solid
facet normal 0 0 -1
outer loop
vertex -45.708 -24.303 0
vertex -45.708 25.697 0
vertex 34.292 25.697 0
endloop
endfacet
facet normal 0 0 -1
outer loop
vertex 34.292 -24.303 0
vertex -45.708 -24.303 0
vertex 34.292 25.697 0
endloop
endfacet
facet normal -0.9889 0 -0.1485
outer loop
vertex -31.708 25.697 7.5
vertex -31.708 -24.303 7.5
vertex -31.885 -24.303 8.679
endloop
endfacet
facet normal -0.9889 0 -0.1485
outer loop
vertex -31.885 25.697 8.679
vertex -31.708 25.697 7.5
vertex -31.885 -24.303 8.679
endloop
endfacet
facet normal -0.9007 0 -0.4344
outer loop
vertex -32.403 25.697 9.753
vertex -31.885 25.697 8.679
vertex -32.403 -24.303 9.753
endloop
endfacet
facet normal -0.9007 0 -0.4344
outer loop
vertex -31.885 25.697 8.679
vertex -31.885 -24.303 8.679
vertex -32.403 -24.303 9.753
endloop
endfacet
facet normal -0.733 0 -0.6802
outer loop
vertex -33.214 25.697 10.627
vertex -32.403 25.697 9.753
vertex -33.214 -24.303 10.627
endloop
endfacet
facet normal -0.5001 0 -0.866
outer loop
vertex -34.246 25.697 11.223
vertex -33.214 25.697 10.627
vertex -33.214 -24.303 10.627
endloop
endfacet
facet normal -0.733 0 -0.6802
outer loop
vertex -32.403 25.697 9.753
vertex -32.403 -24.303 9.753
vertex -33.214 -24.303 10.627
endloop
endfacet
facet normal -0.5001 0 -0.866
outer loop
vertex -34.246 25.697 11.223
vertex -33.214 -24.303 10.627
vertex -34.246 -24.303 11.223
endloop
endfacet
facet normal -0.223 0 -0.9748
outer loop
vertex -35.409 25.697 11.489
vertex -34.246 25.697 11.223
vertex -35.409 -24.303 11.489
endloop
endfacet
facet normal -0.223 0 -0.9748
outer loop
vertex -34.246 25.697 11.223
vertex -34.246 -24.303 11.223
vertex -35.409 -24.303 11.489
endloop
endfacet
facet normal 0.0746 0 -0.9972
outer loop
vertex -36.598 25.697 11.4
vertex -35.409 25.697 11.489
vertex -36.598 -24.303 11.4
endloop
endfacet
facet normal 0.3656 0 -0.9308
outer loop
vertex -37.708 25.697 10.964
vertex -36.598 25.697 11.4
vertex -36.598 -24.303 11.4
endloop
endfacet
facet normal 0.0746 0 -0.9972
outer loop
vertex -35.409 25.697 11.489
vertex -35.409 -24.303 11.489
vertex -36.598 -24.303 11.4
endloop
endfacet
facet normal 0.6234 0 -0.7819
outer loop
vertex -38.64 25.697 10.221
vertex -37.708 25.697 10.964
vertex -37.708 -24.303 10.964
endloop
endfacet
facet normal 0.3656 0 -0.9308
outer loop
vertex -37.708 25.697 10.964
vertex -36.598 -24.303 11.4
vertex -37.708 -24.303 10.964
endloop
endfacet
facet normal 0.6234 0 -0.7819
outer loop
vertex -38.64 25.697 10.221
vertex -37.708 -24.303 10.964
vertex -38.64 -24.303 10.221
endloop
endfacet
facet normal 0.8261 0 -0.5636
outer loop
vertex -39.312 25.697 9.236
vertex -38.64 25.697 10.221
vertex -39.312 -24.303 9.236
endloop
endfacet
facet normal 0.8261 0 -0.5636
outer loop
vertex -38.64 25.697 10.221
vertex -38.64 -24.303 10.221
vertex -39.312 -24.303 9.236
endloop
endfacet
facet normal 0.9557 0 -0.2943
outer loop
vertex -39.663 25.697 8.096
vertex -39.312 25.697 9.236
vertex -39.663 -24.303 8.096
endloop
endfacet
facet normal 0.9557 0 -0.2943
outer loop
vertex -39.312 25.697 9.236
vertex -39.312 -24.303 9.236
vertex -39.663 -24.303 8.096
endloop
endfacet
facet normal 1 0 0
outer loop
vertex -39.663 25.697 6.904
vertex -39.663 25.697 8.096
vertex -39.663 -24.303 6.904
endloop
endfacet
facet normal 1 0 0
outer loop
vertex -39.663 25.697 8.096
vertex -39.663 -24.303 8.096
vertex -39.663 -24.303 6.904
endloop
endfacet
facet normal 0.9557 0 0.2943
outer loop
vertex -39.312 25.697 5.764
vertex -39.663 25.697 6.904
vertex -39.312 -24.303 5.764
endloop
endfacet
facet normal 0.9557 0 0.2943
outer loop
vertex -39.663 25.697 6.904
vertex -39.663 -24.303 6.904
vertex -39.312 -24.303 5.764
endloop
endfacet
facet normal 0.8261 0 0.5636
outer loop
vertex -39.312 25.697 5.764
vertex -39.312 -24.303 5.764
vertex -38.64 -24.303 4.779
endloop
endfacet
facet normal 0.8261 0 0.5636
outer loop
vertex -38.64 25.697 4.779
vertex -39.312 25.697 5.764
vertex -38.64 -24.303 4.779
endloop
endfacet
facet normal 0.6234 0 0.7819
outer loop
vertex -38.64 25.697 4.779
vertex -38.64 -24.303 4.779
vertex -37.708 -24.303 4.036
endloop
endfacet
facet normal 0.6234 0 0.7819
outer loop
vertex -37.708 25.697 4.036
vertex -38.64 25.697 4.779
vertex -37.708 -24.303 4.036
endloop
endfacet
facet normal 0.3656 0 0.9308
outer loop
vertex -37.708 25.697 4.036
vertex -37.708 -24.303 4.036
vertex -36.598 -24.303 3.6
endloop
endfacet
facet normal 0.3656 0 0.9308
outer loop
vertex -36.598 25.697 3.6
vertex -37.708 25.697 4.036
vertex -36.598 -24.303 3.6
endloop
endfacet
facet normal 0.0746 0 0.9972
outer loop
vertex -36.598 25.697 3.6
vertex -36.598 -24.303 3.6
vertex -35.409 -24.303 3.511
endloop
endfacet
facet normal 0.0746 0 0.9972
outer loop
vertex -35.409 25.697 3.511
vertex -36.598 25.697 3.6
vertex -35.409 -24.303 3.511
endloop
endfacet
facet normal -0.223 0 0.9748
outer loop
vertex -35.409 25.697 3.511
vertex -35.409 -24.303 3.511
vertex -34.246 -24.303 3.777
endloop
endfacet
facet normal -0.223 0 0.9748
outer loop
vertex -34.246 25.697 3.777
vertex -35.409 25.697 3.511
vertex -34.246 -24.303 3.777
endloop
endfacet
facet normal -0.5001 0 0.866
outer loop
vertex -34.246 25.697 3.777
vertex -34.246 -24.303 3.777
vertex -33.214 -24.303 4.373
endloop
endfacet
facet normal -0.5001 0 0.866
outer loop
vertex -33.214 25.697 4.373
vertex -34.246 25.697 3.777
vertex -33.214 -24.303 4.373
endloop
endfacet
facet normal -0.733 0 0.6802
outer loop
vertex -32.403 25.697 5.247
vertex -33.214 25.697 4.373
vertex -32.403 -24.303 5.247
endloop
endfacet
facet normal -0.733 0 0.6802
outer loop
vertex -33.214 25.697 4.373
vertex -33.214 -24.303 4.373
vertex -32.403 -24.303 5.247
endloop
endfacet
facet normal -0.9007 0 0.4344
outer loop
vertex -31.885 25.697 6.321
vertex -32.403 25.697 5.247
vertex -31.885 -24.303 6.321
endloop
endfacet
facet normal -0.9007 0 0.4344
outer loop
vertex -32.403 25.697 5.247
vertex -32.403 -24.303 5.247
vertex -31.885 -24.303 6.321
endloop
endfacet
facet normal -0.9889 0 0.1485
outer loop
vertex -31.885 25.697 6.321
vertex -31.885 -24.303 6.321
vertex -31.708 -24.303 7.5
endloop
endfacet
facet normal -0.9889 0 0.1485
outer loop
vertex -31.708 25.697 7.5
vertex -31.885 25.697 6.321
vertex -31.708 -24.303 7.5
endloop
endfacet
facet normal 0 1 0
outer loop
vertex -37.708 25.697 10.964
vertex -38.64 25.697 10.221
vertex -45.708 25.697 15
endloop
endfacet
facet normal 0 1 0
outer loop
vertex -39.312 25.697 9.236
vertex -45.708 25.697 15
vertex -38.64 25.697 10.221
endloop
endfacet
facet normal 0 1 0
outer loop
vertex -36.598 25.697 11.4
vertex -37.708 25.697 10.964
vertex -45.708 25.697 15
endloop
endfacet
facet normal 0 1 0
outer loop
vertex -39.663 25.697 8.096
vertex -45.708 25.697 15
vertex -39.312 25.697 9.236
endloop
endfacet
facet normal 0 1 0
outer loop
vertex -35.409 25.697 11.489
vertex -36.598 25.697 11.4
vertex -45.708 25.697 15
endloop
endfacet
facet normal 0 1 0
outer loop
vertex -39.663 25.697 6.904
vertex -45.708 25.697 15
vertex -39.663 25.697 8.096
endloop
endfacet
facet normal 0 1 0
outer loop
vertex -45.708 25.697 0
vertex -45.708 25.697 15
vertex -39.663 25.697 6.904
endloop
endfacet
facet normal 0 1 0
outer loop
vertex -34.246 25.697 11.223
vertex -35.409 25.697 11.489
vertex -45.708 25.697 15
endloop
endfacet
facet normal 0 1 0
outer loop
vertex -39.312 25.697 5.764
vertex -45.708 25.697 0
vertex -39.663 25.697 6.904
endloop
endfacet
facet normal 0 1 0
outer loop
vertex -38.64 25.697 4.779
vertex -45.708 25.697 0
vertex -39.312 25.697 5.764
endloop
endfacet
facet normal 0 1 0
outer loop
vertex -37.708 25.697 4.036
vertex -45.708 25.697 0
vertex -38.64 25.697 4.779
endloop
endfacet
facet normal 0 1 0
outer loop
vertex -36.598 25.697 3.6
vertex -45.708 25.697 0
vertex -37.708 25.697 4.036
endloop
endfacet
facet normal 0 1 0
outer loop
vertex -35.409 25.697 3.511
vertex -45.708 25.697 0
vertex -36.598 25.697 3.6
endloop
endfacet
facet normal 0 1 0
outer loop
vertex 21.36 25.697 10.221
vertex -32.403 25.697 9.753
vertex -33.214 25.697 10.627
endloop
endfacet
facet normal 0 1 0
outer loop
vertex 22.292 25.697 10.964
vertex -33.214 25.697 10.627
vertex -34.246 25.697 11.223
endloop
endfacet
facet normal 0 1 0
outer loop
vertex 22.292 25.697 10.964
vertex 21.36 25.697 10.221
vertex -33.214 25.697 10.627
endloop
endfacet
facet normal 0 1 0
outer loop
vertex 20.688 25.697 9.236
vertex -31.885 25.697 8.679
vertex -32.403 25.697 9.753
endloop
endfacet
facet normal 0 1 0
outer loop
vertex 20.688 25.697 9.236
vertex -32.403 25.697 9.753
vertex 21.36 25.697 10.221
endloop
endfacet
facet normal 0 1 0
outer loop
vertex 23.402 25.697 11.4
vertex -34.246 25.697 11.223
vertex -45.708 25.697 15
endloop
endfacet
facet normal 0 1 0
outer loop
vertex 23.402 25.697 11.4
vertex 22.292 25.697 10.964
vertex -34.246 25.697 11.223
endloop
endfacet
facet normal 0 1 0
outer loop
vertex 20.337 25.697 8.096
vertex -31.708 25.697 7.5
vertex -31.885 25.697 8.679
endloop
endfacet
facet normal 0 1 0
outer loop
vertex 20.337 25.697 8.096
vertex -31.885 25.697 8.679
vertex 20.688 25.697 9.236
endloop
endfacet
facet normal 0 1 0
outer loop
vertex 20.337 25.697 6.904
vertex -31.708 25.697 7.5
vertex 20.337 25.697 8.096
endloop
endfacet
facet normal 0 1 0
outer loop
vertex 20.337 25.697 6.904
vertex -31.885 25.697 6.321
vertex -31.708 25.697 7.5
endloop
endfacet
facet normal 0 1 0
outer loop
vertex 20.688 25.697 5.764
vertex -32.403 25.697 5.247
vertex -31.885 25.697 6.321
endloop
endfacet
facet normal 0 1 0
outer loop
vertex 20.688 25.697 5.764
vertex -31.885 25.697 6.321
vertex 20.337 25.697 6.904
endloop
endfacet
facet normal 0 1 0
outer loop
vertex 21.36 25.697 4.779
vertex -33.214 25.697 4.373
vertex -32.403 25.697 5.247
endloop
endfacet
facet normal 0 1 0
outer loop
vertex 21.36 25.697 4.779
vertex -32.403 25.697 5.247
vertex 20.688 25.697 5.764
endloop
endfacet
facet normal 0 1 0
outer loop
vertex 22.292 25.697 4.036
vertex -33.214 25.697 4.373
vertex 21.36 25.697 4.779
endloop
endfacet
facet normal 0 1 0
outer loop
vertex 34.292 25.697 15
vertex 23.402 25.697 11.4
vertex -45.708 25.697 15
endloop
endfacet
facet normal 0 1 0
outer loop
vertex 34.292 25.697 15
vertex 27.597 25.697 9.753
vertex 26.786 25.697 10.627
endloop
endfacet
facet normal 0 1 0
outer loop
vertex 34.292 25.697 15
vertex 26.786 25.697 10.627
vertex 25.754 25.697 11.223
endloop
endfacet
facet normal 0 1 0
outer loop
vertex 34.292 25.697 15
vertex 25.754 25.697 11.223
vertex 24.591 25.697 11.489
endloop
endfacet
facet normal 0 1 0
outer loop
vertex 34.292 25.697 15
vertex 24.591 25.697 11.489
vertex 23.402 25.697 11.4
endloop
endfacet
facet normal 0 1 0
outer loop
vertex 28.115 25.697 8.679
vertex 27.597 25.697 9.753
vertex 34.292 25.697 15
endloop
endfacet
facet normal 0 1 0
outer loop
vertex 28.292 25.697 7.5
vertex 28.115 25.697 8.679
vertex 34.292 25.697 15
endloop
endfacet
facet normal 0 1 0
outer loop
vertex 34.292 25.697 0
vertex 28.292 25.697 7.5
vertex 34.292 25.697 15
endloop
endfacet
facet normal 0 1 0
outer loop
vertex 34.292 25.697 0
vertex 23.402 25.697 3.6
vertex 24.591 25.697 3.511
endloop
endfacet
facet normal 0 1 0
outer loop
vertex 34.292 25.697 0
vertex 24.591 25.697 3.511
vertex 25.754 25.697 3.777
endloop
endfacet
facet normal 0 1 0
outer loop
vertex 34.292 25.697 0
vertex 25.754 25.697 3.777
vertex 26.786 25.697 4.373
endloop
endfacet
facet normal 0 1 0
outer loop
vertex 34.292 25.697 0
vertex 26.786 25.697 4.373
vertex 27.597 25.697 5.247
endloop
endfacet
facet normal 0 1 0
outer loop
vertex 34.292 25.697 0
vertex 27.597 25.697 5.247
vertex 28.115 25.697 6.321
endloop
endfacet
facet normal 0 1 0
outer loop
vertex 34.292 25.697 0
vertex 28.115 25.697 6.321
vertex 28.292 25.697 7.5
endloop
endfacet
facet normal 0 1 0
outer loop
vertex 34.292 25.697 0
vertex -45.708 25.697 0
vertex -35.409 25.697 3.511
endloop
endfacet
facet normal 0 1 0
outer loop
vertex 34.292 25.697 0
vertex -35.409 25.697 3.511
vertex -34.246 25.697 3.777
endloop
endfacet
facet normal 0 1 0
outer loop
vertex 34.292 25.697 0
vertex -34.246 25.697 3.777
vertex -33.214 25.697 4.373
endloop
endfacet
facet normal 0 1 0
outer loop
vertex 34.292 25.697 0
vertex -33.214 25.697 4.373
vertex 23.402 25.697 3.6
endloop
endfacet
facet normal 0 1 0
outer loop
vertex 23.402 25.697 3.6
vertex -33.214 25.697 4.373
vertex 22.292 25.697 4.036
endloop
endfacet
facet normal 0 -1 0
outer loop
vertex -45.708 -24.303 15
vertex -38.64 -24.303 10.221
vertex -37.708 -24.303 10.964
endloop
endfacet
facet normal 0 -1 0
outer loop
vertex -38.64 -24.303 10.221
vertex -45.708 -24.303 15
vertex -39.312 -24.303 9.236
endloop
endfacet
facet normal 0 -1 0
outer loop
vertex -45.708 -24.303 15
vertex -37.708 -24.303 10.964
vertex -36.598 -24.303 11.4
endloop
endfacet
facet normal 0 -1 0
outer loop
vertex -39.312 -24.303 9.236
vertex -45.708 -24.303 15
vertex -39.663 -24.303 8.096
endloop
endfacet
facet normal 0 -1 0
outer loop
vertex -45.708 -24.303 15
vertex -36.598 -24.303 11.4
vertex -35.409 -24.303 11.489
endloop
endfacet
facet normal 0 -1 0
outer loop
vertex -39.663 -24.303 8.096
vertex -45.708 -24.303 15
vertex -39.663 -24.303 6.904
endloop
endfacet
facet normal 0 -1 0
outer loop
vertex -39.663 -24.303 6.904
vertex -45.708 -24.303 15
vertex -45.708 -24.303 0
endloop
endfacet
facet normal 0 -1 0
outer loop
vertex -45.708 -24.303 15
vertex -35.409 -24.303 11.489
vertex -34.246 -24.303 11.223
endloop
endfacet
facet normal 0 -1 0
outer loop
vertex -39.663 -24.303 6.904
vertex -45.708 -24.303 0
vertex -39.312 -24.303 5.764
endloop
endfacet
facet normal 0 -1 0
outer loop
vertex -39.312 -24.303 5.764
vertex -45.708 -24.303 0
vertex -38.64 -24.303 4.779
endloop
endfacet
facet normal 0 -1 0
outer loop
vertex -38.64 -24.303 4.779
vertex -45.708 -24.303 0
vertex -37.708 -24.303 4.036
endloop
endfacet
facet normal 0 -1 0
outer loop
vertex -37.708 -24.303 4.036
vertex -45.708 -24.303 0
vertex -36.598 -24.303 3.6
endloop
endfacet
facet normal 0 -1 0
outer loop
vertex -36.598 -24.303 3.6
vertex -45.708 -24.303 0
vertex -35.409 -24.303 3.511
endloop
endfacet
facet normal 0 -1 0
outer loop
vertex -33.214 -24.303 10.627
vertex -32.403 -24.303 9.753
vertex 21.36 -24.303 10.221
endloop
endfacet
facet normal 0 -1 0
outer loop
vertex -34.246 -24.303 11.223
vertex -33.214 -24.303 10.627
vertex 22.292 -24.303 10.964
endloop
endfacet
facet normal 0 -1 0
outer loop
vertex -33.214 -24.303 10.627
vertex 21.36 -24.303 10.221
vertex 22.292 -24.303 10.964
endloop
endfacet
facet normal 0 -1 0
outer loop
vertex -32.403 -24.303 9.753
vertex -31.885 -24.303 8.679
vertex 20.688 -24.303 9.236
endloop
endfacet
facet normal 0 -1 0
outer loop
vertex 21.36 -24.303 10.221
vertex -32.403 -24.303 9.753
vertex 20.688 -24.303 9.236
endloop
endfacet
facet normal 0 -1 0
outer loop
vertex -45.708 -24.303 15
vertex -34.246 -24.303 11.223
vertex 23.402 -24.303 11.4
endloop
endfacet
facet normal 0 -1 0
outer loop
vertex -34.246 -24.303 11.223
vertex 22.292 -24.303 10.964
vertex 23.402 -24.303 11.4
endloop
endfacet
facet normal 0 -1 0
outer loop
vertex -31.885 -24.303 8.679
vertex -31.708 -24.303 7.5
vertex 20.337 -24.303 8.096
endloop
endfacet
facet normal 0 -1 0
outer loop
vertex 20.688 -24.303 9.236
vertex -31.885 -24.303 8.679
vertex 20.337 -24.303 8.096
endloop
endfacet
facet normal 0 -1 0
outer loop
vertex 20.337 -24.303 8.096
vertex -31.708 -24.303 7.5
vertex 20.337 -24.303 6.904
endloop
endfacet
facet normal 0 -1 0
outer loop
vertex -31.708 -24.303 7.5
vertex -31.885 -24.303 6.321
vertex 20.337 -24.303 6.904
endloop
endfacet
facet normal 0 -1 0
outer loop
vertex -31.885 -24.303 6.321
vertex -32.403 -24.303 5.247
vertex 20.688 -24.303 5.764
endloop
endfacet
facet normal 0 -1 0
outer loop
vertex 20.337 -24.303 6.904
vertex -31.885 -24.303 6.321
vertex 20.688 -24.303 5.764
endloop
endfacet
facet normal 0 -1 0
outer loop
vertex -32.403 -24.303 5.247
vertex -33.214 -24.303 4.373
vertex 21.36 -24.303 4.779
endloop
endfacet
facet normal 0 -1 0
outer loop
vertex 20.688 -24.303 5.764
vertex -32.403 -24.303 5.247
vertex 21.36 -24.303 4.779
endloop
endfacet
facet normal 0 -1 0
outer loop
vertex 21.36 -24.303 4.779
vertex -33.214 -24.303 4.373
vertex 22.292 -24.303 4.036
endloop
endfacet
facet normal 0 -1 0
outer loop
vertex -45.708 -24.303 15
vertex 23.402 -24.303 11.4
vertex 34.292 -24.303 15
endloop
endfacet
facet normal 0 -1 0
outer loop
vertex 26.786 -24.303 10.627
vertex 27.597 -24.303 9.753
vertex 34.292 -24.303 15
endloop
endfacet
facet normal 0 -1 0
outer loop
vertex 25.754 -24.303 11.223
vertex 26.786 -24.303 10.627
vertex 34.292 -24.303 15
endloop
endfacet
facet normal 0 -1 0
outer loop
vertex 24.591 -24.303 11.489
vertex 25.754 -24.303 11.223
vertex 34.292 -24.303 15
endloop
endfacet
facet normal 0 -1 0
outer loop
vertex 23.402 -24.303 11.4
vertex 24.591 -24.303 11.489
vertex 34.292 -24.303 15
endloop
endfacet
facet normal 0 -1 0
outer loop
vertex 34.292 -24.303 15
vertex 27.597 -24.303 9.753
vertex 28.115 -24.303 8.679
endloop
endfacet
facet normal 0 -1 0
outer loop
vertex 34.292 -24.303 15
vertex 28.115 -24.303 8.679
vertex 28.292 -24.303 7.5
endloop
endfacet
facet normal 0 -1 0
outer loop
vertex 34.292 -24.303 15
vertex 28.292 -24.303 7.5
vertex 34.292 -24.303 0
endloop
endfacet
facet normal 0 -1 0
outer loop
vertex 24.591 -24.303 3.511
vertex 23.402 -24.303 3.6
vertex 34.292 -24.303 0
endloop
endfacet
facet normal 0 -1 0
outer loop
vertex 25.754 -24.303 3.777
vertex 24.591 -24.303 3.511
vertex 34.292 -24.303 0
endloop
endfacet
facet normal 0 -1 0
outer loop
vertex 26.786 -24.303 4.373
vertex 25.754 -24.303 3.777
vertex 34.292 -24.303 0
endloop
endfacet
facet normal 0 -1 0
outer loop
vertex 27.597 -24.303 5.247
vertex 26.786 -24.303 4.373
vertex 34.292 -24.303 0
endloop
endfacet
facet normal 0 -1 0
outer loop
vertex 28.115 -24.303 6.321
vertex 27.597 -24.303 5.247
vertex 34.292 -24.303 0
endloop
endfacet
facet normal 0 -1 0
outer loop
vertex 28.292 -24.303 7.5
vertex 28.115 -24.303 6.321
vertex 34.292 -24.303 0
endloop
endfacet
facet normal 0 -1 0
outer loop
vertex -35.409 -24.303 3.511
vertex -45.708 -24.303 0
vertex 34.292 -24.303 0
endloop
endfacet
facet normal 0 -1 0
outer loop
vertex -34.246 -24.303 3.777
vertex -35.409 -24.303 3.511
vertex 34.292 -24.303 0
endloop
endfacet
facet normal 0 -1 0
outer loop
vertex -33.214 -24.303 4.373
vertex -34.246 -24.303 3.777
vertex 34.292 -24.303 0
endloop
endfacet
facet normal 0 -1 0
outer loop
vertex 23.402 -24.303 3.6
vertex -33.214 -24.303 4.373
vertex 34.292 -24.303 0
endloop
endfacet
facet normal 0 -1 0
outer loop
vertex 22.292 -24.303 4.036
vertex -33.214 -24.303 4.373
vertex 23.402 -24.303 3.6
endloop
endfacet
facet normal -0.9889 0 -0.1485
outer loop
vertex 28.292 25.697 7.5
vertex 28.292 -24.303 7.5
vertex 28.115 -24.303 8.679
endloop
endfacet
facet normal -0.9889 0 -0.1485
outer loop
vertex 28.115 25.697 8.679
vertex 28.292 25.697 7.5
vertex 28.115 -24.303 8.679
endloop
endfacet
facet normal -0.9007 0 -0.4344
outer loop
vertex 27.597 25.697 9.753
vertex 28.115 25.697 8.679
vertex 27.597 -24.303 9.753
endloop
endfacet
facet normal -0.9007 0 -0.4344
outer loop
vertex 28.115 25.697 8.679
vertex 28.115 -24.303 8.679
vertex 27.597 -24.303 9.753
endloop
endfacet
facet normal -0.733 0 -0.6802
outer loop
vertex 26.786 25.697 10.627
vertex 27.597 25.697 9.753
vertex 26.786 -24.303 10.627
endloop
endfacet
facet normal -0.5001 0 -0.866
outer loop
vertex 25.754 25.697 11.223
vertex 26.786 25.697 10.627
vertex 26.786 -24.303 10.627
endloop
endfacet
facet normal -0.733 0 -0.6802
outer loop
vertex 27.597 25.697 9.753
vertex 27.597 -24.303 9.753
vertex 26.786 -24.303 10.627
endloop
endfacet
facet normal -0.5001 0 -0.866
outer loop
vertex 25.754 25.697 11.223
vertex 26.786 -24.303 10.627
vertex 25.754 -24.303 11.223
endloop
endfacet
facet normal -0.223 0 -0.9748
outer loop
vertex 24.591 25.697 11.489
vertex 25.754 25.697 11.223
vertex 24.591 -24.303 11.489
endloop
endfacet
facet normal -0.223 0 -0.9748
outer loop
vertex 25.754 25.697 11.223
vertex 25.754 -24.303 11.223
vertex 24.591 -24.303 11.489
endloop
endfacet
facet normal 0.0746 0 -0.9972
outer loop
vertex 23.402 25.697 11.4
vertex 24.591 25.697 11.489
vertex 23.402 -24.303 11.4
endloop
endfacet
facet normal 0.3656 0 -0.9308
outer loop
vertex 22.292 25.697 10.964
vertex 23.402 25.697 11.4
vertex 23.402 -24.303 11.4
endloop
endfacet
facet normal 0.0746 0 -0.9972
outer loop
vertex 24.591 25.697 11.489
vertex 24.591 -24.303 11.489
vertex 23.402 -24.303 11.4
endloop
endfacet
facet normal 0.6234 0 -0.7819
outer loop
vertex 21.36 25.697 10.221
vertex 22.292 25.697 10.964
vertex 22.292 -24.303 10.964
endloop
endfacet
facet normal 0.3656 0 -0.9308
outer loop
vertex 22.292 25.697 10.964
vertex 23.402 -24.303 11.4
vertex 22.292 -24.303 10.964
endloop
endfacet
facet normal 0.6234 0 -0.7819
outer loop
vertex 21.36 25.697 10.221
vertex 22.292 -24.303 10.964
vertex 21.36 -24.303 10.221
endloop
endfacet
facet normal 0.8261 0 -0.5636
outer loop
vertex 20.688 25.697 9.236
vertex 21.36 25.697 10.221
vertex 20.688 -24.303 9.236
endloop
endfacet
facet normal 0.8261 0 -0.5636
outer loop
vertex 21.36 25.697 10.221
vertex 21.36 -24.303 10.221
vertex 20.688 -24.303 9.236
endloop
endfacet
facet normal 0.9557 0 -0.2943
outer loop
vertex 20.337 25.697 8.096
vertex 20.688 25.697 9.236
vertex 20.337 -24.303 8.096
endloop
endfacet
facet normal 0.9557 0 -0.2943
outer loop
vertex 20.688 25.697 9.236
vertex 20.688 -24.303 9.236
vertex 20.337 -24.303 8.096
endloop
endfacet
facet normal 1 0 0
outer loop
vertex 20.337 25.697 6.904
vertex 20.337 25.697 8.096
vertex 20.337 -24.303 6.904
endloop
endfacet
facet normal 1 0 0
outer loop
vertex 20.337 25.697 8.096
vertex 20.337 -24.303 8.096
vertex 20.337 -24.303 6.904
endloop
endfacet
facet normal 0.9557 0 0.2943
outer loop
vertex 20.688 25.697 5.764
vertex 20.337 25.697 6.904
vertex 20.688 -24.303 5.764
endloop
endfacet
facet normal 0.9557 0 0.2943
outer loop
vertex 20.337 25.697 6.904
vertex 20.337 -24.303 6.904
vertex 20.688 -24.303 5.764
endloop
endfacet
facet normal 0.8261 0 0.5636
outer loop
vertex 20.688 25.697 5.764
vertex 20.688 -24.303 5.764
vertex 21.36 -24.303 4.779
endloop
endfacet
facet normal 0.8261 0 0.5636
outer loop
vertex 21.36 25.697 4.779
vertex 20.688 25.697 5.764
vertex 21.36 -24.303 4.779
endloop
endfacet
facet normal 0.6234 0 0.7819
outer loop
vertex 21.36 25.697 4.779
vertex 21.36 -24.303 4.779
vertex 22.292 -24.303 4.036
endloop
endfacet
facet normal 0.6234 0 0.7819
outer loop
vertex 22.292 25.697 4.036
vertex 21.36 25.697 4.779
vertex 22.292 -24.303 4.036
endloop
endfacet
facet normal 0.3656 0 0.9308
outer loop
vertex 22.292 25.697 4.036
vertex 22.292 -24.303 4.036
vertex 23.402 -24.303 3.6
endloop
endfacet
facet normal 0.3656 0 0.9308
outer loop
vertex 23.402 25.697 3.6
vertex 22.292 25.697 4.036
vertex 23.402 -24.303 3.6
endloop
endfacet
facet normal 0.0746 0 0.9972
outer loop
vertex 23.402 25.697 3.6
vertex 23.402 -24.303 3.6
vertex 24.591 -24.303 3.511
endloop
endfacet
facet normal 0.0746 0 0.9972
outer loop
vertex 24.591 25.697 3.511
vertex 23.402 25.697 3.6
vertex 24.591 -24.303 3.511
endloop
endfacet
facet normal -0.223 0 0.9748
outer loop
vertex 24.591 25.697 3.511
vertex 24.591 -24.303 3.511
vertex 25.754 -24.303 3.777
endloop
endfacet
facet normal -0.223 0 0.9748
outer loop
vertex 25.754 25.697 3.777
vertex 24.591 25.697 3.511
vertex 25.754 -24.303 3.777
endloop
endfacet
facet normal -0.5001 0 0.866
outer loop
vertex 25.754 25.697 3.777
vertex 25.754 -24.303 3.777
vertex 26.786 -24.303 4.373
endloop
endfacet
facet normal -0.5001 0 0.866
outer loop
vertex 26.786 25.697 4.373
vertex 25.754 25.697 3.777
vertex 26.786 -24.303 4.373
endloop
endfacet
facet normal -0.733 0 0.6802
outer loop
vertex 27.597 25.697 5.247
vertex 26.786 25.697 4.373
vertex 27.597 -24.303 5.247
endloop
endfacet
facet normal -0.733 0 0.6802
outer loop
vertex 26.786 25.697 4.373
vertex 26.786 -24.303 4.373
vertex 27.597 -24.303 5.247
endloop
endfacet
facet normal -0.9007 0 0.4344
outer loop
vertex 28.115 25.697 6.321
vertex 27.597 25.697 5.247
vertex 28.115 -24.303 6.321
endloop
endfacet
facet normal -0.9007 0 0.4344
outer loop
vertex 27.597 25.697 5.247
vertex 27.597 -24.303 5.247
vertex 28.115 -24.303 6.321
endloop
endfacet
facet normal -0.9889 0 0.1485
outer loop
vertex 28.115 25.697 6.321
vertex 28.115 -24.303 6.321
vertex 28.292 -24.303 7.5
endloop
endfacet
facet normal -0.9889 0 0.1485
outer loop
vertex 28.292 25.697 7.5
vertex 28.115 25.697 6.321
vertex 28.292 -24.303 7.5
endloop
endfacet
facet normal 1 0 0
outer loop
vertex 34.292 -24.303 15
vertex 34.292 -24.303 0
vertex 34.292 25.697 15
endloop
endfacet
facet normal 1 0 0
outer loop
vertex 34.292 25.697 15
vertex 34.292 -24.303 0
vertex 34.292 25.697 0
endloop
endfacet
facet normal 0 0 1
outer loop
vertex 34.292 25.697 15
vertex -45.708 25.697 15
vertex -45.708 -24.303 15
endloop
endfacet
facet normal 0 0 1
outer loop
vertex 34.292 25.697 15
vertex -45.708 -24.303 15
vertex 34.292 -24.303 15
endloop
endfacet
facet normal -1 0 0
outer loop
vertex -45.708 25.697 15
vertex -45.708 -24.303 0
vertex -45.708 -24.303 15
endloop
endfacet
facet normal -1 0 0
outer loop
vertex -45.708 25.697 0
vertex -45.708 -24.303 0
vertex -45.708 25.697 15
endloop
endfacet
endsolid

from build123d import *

# Parameters (mm, degrees)
F0_W     = 80
F0_H     = 50
F1_DEPTH = 15
F2_R     = 4
F3_DEPTH = 50


with BuildPart() as f1:
    # F0 (on Top) → F1 (new body)
    with BuildSketch(Plane.XY):
        with Locations((-5.707638, 0.697194)):
            Rectangle(F0_W, F0_H)
    extrude(amount=F1_DEPTH)

    # F2 (on face) → F3 (cut)
    with BuildSketch(Plane.XZ.offset(24.302806)):
        with Locations((-35.707638, 7.5)):
            Circle(F2_R)
        with Locations((24.292362, 7.5)):
            Circle(F2_R)
    extrude(amount=-F3_DEPTH, mode=Mode.SUBTRACT)


solid = f1.part
